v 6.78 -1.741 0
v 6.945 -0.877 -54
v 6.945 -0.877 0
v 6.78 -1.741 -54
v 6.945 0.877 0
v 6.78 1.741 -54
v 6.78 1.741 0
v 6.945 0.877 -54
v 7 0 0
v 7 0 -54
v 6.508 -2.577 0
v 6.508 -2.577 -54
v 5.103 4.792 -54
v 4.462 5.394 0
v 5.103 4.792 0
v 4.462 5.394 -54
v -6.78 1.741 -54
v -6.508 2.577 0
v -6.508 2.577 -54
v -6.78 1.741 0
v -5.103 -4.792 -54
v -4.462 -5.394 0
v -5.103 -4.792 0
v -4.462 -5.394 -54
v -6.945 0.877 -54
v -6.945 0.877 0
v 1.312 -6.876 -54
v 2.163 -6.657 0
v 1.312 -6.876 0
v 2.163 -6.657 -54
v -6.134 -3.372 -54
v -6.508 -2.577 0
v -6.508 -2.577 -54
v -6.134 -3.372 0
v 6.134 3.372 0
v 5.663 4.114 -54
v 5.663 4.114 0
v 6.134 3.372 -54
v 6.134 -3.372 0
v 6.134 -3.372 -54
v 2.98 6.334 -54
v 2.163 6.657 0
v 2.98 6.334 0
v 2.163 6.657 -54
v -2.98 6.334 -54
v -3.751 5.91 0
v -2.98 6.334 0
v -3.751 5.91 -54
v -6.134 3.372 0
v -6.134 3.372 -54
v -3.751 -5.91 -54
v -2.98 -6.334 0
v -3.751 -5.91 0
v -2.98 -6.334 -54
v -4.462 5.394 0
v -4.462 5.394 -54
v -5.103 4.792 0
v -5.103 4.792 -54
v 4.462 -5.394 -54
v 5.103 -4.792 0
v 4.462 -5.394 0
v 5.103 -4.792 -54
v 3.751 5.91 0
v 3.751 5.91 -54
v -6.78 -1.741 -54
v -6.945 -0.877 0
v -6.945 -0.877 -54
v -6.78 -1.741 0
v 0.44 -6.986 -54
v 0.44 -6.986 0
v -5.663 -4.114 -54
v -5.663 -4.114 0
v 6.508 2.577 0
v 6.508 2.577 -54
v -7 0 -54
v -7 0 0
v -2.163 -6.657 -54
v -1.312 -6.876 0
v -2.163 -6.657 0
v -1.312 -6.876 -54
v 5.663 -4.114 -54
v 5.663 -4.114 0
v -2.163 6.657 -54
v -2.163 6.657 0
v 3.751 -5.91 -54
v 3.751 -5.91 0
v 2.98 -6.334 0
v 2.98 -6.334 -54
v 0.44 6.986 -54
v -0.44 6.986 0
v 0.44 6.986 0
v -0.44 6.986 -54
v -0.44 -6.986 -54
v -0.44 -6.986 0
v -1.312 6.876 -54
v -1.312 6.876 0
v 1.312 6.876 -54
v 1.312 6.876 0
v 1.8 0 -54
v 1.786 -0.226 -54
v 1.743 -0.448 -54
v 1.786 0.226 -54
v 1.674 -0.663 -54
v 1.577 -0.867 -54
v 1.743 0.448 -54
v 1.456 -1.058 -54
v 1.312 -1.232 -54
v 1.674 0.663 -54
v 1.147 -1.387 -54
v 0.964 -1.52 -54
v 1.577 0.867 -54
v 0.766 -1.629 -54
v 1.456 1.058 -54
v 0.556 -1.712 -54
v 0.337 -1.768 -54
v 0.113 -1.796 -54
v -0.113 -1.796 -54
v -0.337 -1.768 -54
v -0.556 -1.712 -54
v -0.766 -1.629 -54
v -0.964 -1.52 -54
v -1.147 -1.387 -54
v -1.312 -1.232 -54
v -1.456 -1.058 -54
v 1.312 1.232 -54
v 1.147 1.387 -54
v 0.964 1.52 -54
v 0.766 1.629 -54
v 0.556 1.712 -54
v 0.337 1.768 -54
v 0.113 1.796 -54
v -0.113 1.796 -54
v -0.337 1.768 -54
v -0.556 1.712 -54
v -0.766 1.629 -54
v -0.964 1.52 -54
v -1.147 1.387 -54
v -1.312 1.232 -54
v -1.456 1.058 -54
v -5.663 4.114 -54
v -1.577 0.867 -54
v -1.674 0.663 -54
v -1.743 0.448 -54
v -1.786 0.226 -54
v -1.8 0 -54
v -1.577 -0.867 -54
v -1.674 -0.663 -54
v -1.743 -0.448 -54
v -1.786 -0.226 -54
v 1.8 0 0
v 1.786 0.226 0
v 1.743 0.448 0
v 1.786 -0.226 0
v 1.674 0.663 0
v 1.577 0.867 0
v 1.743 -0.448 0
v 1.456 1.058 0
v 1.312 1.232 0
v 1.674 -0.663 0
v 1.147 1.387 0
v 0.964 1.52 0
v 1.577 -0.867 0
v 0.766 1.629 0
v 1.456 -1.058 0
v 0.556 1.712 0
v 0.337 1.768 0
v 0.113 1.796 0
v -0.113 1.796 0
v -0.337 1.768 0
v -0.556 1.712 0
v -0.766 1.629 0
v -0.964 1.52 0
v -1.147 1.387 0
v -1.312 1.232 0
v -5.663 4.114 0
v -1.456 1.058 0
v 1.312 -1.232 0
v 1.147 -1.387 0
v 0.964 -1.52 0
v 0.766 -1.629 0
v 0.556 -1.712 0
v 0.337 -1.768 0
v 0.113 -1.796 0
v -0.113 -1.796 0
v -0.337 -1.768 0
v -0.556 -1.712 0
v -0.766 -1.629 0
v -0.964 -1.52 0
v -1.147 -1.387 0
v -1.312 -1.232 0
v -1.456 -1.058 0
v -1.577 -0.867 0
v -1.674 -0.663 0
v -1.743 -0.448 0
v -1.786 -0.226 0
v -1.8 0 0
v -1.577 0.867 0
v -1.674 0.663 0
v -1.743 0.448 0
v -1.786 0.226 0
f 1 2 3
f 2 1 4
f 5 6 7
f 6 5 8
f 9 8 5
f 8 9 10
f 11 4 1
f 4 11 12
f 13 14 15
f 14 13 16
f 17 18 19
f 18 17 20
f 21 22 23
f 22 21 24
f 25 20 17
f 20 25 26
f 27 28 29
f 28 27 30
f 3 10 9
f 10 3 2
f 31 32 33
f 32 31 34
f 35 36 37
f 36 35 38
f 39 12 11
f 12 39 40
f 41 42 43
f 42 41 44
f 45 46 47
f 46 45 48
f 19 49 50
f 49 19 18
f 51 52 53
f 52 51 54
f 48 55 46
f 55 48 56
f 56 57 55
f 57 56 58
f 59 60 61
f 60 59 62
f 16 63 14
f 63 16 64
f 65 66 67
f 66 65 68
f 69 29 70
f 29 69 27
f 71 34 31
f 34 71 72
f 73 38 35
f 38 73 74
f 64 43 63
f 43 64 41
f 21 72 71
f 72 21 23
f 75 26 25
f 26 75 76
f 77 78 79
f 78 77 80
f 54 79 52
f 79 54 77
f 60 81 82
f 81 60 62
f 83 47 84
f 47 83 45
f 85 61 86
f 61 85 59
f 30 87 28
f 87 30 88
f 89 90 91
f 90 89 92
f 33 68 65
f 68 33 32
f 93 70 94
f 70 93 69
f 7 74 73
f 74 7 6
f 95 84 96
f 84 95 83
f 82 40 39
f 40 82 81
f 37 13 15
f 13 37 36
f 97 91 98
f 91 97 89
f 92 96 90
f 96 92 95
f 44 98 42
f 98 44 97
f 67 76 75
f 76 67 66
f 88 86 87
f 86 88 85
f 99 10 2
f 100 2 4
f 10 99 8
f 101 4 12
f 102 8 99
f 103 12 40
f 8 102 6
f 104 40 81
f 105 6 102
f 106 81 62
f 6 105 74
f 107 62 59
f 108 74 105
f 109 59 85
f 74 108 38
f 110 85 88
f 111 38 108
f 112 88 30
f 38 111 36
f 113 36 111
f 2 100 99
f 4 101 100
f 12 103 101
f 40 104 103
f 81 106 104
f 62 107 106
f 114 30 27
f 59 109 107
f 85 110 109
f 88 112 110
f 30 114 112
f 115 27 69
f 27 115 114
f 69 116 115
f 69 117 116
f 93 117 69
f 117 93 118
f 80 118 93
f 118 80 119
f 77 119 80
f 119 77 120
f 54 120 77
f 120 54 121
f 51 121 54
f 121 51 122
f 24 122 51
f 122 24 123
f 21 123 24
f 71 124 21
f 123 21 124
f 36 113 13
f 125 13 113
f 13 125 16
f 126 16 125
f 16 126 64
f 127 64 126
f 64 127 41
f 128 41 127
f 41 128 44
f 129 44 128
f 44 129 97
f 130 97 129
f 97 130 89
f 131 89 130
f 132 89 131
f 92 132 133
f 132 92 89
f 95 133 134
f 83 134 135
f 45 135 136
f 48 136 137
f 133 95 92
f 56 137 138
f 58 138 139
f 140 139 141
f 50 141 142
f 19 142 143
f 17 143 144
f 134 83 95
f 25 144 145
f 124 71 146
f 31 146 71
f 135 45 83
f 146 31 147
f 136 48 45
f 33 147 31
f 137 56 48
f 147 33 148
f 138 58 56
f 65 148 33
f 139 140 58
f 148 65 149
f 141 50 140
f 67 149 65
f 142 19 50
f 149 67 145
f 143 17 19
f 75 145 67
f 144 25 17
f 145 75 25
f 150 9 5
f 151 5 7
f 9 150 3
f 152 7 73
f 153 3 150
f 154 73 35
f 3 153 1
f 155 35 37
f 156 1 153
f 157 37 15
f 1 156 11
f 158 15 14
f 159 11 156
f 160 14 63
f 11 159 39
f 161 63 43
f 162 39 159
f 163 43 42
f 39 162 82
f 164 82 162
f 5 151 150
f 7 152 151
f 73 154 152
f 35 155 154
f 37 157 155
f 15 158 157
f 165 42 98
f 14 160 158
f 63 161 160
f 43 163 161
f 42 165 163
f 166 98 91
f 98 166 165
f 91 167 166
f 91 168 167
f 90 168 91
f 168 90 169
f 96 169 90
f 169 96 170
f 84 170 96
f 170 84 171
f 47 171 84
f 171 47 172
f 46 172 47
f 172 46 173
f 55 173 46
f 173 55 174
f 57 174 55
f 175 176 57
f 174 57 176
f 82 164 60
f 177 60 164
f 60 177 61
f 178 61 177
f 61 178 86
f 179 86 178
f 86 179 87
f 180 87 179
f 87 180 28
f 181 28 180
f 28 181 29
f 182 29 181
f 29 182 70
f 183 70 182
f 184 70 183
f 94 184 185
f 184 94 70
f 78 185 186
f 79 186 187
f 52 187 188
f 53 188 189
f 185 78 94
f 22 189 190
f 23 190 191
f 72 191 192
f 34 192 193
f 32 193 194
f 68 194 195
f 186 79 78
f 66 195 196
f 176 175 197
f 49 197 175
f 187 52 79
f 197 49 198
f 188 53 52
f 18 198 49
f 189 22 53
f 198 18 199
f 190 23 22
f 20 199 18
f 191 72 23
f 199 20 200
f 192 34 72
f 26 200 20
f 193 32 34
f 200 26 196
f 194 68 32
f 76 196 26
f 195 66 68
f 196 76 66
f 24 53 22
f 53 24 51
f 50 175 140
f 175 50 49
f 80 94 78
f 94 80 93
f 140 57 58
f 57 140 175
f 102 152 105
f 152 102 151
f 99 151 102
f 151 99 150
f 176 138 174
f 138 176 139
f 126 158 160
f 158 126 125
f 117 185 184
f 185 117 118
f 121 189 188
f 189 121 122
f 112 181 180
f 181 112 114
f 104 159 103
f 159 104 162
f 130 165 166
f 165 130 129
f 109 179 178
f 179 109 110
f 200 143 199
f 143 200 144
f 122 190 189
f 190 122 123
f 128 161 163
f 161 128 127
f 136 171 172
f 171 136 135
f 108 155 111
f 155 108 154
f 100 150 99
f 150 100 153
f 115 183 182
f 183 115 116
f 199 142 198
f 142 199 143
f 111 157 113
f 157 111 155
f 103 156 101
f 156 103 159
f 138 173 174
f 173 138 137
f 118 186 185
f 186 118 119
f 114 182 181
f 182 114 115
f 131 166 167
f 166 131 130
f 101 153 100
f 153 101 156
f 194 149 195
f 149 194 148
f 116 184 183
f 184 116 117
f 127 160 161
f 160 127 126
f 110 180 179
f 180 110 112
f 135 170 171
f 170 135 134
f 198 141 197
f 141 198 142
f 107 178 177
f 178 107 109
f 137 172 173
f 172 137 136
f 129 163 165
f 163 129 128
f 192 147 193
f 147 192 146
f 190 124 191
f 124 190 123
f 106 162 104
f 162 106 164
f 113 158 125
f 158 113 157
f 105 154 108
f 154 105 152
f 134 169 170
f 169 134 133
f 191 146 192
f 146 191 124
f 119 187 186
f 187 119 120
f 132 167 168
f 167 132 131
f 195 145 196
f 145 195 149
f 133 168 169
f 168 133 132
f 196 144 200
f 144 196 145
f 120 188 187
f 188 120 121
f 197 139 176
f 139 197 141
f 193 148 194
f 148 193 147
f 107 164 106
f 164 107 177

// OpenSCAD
$fn = 50;


difference() {
	union() {
		translate(v = [0, 0, -54.0000000000]) {
			cylinder(h = 54, r = 7.0000000000);
		}
		cylinder(h = 0, r = 16.0000000000);
	}
	union() {
		#translate(v = [0, 0, -54]) {
			cylinder(h = 54, r = 1.8000000000);
		}
	}
}
